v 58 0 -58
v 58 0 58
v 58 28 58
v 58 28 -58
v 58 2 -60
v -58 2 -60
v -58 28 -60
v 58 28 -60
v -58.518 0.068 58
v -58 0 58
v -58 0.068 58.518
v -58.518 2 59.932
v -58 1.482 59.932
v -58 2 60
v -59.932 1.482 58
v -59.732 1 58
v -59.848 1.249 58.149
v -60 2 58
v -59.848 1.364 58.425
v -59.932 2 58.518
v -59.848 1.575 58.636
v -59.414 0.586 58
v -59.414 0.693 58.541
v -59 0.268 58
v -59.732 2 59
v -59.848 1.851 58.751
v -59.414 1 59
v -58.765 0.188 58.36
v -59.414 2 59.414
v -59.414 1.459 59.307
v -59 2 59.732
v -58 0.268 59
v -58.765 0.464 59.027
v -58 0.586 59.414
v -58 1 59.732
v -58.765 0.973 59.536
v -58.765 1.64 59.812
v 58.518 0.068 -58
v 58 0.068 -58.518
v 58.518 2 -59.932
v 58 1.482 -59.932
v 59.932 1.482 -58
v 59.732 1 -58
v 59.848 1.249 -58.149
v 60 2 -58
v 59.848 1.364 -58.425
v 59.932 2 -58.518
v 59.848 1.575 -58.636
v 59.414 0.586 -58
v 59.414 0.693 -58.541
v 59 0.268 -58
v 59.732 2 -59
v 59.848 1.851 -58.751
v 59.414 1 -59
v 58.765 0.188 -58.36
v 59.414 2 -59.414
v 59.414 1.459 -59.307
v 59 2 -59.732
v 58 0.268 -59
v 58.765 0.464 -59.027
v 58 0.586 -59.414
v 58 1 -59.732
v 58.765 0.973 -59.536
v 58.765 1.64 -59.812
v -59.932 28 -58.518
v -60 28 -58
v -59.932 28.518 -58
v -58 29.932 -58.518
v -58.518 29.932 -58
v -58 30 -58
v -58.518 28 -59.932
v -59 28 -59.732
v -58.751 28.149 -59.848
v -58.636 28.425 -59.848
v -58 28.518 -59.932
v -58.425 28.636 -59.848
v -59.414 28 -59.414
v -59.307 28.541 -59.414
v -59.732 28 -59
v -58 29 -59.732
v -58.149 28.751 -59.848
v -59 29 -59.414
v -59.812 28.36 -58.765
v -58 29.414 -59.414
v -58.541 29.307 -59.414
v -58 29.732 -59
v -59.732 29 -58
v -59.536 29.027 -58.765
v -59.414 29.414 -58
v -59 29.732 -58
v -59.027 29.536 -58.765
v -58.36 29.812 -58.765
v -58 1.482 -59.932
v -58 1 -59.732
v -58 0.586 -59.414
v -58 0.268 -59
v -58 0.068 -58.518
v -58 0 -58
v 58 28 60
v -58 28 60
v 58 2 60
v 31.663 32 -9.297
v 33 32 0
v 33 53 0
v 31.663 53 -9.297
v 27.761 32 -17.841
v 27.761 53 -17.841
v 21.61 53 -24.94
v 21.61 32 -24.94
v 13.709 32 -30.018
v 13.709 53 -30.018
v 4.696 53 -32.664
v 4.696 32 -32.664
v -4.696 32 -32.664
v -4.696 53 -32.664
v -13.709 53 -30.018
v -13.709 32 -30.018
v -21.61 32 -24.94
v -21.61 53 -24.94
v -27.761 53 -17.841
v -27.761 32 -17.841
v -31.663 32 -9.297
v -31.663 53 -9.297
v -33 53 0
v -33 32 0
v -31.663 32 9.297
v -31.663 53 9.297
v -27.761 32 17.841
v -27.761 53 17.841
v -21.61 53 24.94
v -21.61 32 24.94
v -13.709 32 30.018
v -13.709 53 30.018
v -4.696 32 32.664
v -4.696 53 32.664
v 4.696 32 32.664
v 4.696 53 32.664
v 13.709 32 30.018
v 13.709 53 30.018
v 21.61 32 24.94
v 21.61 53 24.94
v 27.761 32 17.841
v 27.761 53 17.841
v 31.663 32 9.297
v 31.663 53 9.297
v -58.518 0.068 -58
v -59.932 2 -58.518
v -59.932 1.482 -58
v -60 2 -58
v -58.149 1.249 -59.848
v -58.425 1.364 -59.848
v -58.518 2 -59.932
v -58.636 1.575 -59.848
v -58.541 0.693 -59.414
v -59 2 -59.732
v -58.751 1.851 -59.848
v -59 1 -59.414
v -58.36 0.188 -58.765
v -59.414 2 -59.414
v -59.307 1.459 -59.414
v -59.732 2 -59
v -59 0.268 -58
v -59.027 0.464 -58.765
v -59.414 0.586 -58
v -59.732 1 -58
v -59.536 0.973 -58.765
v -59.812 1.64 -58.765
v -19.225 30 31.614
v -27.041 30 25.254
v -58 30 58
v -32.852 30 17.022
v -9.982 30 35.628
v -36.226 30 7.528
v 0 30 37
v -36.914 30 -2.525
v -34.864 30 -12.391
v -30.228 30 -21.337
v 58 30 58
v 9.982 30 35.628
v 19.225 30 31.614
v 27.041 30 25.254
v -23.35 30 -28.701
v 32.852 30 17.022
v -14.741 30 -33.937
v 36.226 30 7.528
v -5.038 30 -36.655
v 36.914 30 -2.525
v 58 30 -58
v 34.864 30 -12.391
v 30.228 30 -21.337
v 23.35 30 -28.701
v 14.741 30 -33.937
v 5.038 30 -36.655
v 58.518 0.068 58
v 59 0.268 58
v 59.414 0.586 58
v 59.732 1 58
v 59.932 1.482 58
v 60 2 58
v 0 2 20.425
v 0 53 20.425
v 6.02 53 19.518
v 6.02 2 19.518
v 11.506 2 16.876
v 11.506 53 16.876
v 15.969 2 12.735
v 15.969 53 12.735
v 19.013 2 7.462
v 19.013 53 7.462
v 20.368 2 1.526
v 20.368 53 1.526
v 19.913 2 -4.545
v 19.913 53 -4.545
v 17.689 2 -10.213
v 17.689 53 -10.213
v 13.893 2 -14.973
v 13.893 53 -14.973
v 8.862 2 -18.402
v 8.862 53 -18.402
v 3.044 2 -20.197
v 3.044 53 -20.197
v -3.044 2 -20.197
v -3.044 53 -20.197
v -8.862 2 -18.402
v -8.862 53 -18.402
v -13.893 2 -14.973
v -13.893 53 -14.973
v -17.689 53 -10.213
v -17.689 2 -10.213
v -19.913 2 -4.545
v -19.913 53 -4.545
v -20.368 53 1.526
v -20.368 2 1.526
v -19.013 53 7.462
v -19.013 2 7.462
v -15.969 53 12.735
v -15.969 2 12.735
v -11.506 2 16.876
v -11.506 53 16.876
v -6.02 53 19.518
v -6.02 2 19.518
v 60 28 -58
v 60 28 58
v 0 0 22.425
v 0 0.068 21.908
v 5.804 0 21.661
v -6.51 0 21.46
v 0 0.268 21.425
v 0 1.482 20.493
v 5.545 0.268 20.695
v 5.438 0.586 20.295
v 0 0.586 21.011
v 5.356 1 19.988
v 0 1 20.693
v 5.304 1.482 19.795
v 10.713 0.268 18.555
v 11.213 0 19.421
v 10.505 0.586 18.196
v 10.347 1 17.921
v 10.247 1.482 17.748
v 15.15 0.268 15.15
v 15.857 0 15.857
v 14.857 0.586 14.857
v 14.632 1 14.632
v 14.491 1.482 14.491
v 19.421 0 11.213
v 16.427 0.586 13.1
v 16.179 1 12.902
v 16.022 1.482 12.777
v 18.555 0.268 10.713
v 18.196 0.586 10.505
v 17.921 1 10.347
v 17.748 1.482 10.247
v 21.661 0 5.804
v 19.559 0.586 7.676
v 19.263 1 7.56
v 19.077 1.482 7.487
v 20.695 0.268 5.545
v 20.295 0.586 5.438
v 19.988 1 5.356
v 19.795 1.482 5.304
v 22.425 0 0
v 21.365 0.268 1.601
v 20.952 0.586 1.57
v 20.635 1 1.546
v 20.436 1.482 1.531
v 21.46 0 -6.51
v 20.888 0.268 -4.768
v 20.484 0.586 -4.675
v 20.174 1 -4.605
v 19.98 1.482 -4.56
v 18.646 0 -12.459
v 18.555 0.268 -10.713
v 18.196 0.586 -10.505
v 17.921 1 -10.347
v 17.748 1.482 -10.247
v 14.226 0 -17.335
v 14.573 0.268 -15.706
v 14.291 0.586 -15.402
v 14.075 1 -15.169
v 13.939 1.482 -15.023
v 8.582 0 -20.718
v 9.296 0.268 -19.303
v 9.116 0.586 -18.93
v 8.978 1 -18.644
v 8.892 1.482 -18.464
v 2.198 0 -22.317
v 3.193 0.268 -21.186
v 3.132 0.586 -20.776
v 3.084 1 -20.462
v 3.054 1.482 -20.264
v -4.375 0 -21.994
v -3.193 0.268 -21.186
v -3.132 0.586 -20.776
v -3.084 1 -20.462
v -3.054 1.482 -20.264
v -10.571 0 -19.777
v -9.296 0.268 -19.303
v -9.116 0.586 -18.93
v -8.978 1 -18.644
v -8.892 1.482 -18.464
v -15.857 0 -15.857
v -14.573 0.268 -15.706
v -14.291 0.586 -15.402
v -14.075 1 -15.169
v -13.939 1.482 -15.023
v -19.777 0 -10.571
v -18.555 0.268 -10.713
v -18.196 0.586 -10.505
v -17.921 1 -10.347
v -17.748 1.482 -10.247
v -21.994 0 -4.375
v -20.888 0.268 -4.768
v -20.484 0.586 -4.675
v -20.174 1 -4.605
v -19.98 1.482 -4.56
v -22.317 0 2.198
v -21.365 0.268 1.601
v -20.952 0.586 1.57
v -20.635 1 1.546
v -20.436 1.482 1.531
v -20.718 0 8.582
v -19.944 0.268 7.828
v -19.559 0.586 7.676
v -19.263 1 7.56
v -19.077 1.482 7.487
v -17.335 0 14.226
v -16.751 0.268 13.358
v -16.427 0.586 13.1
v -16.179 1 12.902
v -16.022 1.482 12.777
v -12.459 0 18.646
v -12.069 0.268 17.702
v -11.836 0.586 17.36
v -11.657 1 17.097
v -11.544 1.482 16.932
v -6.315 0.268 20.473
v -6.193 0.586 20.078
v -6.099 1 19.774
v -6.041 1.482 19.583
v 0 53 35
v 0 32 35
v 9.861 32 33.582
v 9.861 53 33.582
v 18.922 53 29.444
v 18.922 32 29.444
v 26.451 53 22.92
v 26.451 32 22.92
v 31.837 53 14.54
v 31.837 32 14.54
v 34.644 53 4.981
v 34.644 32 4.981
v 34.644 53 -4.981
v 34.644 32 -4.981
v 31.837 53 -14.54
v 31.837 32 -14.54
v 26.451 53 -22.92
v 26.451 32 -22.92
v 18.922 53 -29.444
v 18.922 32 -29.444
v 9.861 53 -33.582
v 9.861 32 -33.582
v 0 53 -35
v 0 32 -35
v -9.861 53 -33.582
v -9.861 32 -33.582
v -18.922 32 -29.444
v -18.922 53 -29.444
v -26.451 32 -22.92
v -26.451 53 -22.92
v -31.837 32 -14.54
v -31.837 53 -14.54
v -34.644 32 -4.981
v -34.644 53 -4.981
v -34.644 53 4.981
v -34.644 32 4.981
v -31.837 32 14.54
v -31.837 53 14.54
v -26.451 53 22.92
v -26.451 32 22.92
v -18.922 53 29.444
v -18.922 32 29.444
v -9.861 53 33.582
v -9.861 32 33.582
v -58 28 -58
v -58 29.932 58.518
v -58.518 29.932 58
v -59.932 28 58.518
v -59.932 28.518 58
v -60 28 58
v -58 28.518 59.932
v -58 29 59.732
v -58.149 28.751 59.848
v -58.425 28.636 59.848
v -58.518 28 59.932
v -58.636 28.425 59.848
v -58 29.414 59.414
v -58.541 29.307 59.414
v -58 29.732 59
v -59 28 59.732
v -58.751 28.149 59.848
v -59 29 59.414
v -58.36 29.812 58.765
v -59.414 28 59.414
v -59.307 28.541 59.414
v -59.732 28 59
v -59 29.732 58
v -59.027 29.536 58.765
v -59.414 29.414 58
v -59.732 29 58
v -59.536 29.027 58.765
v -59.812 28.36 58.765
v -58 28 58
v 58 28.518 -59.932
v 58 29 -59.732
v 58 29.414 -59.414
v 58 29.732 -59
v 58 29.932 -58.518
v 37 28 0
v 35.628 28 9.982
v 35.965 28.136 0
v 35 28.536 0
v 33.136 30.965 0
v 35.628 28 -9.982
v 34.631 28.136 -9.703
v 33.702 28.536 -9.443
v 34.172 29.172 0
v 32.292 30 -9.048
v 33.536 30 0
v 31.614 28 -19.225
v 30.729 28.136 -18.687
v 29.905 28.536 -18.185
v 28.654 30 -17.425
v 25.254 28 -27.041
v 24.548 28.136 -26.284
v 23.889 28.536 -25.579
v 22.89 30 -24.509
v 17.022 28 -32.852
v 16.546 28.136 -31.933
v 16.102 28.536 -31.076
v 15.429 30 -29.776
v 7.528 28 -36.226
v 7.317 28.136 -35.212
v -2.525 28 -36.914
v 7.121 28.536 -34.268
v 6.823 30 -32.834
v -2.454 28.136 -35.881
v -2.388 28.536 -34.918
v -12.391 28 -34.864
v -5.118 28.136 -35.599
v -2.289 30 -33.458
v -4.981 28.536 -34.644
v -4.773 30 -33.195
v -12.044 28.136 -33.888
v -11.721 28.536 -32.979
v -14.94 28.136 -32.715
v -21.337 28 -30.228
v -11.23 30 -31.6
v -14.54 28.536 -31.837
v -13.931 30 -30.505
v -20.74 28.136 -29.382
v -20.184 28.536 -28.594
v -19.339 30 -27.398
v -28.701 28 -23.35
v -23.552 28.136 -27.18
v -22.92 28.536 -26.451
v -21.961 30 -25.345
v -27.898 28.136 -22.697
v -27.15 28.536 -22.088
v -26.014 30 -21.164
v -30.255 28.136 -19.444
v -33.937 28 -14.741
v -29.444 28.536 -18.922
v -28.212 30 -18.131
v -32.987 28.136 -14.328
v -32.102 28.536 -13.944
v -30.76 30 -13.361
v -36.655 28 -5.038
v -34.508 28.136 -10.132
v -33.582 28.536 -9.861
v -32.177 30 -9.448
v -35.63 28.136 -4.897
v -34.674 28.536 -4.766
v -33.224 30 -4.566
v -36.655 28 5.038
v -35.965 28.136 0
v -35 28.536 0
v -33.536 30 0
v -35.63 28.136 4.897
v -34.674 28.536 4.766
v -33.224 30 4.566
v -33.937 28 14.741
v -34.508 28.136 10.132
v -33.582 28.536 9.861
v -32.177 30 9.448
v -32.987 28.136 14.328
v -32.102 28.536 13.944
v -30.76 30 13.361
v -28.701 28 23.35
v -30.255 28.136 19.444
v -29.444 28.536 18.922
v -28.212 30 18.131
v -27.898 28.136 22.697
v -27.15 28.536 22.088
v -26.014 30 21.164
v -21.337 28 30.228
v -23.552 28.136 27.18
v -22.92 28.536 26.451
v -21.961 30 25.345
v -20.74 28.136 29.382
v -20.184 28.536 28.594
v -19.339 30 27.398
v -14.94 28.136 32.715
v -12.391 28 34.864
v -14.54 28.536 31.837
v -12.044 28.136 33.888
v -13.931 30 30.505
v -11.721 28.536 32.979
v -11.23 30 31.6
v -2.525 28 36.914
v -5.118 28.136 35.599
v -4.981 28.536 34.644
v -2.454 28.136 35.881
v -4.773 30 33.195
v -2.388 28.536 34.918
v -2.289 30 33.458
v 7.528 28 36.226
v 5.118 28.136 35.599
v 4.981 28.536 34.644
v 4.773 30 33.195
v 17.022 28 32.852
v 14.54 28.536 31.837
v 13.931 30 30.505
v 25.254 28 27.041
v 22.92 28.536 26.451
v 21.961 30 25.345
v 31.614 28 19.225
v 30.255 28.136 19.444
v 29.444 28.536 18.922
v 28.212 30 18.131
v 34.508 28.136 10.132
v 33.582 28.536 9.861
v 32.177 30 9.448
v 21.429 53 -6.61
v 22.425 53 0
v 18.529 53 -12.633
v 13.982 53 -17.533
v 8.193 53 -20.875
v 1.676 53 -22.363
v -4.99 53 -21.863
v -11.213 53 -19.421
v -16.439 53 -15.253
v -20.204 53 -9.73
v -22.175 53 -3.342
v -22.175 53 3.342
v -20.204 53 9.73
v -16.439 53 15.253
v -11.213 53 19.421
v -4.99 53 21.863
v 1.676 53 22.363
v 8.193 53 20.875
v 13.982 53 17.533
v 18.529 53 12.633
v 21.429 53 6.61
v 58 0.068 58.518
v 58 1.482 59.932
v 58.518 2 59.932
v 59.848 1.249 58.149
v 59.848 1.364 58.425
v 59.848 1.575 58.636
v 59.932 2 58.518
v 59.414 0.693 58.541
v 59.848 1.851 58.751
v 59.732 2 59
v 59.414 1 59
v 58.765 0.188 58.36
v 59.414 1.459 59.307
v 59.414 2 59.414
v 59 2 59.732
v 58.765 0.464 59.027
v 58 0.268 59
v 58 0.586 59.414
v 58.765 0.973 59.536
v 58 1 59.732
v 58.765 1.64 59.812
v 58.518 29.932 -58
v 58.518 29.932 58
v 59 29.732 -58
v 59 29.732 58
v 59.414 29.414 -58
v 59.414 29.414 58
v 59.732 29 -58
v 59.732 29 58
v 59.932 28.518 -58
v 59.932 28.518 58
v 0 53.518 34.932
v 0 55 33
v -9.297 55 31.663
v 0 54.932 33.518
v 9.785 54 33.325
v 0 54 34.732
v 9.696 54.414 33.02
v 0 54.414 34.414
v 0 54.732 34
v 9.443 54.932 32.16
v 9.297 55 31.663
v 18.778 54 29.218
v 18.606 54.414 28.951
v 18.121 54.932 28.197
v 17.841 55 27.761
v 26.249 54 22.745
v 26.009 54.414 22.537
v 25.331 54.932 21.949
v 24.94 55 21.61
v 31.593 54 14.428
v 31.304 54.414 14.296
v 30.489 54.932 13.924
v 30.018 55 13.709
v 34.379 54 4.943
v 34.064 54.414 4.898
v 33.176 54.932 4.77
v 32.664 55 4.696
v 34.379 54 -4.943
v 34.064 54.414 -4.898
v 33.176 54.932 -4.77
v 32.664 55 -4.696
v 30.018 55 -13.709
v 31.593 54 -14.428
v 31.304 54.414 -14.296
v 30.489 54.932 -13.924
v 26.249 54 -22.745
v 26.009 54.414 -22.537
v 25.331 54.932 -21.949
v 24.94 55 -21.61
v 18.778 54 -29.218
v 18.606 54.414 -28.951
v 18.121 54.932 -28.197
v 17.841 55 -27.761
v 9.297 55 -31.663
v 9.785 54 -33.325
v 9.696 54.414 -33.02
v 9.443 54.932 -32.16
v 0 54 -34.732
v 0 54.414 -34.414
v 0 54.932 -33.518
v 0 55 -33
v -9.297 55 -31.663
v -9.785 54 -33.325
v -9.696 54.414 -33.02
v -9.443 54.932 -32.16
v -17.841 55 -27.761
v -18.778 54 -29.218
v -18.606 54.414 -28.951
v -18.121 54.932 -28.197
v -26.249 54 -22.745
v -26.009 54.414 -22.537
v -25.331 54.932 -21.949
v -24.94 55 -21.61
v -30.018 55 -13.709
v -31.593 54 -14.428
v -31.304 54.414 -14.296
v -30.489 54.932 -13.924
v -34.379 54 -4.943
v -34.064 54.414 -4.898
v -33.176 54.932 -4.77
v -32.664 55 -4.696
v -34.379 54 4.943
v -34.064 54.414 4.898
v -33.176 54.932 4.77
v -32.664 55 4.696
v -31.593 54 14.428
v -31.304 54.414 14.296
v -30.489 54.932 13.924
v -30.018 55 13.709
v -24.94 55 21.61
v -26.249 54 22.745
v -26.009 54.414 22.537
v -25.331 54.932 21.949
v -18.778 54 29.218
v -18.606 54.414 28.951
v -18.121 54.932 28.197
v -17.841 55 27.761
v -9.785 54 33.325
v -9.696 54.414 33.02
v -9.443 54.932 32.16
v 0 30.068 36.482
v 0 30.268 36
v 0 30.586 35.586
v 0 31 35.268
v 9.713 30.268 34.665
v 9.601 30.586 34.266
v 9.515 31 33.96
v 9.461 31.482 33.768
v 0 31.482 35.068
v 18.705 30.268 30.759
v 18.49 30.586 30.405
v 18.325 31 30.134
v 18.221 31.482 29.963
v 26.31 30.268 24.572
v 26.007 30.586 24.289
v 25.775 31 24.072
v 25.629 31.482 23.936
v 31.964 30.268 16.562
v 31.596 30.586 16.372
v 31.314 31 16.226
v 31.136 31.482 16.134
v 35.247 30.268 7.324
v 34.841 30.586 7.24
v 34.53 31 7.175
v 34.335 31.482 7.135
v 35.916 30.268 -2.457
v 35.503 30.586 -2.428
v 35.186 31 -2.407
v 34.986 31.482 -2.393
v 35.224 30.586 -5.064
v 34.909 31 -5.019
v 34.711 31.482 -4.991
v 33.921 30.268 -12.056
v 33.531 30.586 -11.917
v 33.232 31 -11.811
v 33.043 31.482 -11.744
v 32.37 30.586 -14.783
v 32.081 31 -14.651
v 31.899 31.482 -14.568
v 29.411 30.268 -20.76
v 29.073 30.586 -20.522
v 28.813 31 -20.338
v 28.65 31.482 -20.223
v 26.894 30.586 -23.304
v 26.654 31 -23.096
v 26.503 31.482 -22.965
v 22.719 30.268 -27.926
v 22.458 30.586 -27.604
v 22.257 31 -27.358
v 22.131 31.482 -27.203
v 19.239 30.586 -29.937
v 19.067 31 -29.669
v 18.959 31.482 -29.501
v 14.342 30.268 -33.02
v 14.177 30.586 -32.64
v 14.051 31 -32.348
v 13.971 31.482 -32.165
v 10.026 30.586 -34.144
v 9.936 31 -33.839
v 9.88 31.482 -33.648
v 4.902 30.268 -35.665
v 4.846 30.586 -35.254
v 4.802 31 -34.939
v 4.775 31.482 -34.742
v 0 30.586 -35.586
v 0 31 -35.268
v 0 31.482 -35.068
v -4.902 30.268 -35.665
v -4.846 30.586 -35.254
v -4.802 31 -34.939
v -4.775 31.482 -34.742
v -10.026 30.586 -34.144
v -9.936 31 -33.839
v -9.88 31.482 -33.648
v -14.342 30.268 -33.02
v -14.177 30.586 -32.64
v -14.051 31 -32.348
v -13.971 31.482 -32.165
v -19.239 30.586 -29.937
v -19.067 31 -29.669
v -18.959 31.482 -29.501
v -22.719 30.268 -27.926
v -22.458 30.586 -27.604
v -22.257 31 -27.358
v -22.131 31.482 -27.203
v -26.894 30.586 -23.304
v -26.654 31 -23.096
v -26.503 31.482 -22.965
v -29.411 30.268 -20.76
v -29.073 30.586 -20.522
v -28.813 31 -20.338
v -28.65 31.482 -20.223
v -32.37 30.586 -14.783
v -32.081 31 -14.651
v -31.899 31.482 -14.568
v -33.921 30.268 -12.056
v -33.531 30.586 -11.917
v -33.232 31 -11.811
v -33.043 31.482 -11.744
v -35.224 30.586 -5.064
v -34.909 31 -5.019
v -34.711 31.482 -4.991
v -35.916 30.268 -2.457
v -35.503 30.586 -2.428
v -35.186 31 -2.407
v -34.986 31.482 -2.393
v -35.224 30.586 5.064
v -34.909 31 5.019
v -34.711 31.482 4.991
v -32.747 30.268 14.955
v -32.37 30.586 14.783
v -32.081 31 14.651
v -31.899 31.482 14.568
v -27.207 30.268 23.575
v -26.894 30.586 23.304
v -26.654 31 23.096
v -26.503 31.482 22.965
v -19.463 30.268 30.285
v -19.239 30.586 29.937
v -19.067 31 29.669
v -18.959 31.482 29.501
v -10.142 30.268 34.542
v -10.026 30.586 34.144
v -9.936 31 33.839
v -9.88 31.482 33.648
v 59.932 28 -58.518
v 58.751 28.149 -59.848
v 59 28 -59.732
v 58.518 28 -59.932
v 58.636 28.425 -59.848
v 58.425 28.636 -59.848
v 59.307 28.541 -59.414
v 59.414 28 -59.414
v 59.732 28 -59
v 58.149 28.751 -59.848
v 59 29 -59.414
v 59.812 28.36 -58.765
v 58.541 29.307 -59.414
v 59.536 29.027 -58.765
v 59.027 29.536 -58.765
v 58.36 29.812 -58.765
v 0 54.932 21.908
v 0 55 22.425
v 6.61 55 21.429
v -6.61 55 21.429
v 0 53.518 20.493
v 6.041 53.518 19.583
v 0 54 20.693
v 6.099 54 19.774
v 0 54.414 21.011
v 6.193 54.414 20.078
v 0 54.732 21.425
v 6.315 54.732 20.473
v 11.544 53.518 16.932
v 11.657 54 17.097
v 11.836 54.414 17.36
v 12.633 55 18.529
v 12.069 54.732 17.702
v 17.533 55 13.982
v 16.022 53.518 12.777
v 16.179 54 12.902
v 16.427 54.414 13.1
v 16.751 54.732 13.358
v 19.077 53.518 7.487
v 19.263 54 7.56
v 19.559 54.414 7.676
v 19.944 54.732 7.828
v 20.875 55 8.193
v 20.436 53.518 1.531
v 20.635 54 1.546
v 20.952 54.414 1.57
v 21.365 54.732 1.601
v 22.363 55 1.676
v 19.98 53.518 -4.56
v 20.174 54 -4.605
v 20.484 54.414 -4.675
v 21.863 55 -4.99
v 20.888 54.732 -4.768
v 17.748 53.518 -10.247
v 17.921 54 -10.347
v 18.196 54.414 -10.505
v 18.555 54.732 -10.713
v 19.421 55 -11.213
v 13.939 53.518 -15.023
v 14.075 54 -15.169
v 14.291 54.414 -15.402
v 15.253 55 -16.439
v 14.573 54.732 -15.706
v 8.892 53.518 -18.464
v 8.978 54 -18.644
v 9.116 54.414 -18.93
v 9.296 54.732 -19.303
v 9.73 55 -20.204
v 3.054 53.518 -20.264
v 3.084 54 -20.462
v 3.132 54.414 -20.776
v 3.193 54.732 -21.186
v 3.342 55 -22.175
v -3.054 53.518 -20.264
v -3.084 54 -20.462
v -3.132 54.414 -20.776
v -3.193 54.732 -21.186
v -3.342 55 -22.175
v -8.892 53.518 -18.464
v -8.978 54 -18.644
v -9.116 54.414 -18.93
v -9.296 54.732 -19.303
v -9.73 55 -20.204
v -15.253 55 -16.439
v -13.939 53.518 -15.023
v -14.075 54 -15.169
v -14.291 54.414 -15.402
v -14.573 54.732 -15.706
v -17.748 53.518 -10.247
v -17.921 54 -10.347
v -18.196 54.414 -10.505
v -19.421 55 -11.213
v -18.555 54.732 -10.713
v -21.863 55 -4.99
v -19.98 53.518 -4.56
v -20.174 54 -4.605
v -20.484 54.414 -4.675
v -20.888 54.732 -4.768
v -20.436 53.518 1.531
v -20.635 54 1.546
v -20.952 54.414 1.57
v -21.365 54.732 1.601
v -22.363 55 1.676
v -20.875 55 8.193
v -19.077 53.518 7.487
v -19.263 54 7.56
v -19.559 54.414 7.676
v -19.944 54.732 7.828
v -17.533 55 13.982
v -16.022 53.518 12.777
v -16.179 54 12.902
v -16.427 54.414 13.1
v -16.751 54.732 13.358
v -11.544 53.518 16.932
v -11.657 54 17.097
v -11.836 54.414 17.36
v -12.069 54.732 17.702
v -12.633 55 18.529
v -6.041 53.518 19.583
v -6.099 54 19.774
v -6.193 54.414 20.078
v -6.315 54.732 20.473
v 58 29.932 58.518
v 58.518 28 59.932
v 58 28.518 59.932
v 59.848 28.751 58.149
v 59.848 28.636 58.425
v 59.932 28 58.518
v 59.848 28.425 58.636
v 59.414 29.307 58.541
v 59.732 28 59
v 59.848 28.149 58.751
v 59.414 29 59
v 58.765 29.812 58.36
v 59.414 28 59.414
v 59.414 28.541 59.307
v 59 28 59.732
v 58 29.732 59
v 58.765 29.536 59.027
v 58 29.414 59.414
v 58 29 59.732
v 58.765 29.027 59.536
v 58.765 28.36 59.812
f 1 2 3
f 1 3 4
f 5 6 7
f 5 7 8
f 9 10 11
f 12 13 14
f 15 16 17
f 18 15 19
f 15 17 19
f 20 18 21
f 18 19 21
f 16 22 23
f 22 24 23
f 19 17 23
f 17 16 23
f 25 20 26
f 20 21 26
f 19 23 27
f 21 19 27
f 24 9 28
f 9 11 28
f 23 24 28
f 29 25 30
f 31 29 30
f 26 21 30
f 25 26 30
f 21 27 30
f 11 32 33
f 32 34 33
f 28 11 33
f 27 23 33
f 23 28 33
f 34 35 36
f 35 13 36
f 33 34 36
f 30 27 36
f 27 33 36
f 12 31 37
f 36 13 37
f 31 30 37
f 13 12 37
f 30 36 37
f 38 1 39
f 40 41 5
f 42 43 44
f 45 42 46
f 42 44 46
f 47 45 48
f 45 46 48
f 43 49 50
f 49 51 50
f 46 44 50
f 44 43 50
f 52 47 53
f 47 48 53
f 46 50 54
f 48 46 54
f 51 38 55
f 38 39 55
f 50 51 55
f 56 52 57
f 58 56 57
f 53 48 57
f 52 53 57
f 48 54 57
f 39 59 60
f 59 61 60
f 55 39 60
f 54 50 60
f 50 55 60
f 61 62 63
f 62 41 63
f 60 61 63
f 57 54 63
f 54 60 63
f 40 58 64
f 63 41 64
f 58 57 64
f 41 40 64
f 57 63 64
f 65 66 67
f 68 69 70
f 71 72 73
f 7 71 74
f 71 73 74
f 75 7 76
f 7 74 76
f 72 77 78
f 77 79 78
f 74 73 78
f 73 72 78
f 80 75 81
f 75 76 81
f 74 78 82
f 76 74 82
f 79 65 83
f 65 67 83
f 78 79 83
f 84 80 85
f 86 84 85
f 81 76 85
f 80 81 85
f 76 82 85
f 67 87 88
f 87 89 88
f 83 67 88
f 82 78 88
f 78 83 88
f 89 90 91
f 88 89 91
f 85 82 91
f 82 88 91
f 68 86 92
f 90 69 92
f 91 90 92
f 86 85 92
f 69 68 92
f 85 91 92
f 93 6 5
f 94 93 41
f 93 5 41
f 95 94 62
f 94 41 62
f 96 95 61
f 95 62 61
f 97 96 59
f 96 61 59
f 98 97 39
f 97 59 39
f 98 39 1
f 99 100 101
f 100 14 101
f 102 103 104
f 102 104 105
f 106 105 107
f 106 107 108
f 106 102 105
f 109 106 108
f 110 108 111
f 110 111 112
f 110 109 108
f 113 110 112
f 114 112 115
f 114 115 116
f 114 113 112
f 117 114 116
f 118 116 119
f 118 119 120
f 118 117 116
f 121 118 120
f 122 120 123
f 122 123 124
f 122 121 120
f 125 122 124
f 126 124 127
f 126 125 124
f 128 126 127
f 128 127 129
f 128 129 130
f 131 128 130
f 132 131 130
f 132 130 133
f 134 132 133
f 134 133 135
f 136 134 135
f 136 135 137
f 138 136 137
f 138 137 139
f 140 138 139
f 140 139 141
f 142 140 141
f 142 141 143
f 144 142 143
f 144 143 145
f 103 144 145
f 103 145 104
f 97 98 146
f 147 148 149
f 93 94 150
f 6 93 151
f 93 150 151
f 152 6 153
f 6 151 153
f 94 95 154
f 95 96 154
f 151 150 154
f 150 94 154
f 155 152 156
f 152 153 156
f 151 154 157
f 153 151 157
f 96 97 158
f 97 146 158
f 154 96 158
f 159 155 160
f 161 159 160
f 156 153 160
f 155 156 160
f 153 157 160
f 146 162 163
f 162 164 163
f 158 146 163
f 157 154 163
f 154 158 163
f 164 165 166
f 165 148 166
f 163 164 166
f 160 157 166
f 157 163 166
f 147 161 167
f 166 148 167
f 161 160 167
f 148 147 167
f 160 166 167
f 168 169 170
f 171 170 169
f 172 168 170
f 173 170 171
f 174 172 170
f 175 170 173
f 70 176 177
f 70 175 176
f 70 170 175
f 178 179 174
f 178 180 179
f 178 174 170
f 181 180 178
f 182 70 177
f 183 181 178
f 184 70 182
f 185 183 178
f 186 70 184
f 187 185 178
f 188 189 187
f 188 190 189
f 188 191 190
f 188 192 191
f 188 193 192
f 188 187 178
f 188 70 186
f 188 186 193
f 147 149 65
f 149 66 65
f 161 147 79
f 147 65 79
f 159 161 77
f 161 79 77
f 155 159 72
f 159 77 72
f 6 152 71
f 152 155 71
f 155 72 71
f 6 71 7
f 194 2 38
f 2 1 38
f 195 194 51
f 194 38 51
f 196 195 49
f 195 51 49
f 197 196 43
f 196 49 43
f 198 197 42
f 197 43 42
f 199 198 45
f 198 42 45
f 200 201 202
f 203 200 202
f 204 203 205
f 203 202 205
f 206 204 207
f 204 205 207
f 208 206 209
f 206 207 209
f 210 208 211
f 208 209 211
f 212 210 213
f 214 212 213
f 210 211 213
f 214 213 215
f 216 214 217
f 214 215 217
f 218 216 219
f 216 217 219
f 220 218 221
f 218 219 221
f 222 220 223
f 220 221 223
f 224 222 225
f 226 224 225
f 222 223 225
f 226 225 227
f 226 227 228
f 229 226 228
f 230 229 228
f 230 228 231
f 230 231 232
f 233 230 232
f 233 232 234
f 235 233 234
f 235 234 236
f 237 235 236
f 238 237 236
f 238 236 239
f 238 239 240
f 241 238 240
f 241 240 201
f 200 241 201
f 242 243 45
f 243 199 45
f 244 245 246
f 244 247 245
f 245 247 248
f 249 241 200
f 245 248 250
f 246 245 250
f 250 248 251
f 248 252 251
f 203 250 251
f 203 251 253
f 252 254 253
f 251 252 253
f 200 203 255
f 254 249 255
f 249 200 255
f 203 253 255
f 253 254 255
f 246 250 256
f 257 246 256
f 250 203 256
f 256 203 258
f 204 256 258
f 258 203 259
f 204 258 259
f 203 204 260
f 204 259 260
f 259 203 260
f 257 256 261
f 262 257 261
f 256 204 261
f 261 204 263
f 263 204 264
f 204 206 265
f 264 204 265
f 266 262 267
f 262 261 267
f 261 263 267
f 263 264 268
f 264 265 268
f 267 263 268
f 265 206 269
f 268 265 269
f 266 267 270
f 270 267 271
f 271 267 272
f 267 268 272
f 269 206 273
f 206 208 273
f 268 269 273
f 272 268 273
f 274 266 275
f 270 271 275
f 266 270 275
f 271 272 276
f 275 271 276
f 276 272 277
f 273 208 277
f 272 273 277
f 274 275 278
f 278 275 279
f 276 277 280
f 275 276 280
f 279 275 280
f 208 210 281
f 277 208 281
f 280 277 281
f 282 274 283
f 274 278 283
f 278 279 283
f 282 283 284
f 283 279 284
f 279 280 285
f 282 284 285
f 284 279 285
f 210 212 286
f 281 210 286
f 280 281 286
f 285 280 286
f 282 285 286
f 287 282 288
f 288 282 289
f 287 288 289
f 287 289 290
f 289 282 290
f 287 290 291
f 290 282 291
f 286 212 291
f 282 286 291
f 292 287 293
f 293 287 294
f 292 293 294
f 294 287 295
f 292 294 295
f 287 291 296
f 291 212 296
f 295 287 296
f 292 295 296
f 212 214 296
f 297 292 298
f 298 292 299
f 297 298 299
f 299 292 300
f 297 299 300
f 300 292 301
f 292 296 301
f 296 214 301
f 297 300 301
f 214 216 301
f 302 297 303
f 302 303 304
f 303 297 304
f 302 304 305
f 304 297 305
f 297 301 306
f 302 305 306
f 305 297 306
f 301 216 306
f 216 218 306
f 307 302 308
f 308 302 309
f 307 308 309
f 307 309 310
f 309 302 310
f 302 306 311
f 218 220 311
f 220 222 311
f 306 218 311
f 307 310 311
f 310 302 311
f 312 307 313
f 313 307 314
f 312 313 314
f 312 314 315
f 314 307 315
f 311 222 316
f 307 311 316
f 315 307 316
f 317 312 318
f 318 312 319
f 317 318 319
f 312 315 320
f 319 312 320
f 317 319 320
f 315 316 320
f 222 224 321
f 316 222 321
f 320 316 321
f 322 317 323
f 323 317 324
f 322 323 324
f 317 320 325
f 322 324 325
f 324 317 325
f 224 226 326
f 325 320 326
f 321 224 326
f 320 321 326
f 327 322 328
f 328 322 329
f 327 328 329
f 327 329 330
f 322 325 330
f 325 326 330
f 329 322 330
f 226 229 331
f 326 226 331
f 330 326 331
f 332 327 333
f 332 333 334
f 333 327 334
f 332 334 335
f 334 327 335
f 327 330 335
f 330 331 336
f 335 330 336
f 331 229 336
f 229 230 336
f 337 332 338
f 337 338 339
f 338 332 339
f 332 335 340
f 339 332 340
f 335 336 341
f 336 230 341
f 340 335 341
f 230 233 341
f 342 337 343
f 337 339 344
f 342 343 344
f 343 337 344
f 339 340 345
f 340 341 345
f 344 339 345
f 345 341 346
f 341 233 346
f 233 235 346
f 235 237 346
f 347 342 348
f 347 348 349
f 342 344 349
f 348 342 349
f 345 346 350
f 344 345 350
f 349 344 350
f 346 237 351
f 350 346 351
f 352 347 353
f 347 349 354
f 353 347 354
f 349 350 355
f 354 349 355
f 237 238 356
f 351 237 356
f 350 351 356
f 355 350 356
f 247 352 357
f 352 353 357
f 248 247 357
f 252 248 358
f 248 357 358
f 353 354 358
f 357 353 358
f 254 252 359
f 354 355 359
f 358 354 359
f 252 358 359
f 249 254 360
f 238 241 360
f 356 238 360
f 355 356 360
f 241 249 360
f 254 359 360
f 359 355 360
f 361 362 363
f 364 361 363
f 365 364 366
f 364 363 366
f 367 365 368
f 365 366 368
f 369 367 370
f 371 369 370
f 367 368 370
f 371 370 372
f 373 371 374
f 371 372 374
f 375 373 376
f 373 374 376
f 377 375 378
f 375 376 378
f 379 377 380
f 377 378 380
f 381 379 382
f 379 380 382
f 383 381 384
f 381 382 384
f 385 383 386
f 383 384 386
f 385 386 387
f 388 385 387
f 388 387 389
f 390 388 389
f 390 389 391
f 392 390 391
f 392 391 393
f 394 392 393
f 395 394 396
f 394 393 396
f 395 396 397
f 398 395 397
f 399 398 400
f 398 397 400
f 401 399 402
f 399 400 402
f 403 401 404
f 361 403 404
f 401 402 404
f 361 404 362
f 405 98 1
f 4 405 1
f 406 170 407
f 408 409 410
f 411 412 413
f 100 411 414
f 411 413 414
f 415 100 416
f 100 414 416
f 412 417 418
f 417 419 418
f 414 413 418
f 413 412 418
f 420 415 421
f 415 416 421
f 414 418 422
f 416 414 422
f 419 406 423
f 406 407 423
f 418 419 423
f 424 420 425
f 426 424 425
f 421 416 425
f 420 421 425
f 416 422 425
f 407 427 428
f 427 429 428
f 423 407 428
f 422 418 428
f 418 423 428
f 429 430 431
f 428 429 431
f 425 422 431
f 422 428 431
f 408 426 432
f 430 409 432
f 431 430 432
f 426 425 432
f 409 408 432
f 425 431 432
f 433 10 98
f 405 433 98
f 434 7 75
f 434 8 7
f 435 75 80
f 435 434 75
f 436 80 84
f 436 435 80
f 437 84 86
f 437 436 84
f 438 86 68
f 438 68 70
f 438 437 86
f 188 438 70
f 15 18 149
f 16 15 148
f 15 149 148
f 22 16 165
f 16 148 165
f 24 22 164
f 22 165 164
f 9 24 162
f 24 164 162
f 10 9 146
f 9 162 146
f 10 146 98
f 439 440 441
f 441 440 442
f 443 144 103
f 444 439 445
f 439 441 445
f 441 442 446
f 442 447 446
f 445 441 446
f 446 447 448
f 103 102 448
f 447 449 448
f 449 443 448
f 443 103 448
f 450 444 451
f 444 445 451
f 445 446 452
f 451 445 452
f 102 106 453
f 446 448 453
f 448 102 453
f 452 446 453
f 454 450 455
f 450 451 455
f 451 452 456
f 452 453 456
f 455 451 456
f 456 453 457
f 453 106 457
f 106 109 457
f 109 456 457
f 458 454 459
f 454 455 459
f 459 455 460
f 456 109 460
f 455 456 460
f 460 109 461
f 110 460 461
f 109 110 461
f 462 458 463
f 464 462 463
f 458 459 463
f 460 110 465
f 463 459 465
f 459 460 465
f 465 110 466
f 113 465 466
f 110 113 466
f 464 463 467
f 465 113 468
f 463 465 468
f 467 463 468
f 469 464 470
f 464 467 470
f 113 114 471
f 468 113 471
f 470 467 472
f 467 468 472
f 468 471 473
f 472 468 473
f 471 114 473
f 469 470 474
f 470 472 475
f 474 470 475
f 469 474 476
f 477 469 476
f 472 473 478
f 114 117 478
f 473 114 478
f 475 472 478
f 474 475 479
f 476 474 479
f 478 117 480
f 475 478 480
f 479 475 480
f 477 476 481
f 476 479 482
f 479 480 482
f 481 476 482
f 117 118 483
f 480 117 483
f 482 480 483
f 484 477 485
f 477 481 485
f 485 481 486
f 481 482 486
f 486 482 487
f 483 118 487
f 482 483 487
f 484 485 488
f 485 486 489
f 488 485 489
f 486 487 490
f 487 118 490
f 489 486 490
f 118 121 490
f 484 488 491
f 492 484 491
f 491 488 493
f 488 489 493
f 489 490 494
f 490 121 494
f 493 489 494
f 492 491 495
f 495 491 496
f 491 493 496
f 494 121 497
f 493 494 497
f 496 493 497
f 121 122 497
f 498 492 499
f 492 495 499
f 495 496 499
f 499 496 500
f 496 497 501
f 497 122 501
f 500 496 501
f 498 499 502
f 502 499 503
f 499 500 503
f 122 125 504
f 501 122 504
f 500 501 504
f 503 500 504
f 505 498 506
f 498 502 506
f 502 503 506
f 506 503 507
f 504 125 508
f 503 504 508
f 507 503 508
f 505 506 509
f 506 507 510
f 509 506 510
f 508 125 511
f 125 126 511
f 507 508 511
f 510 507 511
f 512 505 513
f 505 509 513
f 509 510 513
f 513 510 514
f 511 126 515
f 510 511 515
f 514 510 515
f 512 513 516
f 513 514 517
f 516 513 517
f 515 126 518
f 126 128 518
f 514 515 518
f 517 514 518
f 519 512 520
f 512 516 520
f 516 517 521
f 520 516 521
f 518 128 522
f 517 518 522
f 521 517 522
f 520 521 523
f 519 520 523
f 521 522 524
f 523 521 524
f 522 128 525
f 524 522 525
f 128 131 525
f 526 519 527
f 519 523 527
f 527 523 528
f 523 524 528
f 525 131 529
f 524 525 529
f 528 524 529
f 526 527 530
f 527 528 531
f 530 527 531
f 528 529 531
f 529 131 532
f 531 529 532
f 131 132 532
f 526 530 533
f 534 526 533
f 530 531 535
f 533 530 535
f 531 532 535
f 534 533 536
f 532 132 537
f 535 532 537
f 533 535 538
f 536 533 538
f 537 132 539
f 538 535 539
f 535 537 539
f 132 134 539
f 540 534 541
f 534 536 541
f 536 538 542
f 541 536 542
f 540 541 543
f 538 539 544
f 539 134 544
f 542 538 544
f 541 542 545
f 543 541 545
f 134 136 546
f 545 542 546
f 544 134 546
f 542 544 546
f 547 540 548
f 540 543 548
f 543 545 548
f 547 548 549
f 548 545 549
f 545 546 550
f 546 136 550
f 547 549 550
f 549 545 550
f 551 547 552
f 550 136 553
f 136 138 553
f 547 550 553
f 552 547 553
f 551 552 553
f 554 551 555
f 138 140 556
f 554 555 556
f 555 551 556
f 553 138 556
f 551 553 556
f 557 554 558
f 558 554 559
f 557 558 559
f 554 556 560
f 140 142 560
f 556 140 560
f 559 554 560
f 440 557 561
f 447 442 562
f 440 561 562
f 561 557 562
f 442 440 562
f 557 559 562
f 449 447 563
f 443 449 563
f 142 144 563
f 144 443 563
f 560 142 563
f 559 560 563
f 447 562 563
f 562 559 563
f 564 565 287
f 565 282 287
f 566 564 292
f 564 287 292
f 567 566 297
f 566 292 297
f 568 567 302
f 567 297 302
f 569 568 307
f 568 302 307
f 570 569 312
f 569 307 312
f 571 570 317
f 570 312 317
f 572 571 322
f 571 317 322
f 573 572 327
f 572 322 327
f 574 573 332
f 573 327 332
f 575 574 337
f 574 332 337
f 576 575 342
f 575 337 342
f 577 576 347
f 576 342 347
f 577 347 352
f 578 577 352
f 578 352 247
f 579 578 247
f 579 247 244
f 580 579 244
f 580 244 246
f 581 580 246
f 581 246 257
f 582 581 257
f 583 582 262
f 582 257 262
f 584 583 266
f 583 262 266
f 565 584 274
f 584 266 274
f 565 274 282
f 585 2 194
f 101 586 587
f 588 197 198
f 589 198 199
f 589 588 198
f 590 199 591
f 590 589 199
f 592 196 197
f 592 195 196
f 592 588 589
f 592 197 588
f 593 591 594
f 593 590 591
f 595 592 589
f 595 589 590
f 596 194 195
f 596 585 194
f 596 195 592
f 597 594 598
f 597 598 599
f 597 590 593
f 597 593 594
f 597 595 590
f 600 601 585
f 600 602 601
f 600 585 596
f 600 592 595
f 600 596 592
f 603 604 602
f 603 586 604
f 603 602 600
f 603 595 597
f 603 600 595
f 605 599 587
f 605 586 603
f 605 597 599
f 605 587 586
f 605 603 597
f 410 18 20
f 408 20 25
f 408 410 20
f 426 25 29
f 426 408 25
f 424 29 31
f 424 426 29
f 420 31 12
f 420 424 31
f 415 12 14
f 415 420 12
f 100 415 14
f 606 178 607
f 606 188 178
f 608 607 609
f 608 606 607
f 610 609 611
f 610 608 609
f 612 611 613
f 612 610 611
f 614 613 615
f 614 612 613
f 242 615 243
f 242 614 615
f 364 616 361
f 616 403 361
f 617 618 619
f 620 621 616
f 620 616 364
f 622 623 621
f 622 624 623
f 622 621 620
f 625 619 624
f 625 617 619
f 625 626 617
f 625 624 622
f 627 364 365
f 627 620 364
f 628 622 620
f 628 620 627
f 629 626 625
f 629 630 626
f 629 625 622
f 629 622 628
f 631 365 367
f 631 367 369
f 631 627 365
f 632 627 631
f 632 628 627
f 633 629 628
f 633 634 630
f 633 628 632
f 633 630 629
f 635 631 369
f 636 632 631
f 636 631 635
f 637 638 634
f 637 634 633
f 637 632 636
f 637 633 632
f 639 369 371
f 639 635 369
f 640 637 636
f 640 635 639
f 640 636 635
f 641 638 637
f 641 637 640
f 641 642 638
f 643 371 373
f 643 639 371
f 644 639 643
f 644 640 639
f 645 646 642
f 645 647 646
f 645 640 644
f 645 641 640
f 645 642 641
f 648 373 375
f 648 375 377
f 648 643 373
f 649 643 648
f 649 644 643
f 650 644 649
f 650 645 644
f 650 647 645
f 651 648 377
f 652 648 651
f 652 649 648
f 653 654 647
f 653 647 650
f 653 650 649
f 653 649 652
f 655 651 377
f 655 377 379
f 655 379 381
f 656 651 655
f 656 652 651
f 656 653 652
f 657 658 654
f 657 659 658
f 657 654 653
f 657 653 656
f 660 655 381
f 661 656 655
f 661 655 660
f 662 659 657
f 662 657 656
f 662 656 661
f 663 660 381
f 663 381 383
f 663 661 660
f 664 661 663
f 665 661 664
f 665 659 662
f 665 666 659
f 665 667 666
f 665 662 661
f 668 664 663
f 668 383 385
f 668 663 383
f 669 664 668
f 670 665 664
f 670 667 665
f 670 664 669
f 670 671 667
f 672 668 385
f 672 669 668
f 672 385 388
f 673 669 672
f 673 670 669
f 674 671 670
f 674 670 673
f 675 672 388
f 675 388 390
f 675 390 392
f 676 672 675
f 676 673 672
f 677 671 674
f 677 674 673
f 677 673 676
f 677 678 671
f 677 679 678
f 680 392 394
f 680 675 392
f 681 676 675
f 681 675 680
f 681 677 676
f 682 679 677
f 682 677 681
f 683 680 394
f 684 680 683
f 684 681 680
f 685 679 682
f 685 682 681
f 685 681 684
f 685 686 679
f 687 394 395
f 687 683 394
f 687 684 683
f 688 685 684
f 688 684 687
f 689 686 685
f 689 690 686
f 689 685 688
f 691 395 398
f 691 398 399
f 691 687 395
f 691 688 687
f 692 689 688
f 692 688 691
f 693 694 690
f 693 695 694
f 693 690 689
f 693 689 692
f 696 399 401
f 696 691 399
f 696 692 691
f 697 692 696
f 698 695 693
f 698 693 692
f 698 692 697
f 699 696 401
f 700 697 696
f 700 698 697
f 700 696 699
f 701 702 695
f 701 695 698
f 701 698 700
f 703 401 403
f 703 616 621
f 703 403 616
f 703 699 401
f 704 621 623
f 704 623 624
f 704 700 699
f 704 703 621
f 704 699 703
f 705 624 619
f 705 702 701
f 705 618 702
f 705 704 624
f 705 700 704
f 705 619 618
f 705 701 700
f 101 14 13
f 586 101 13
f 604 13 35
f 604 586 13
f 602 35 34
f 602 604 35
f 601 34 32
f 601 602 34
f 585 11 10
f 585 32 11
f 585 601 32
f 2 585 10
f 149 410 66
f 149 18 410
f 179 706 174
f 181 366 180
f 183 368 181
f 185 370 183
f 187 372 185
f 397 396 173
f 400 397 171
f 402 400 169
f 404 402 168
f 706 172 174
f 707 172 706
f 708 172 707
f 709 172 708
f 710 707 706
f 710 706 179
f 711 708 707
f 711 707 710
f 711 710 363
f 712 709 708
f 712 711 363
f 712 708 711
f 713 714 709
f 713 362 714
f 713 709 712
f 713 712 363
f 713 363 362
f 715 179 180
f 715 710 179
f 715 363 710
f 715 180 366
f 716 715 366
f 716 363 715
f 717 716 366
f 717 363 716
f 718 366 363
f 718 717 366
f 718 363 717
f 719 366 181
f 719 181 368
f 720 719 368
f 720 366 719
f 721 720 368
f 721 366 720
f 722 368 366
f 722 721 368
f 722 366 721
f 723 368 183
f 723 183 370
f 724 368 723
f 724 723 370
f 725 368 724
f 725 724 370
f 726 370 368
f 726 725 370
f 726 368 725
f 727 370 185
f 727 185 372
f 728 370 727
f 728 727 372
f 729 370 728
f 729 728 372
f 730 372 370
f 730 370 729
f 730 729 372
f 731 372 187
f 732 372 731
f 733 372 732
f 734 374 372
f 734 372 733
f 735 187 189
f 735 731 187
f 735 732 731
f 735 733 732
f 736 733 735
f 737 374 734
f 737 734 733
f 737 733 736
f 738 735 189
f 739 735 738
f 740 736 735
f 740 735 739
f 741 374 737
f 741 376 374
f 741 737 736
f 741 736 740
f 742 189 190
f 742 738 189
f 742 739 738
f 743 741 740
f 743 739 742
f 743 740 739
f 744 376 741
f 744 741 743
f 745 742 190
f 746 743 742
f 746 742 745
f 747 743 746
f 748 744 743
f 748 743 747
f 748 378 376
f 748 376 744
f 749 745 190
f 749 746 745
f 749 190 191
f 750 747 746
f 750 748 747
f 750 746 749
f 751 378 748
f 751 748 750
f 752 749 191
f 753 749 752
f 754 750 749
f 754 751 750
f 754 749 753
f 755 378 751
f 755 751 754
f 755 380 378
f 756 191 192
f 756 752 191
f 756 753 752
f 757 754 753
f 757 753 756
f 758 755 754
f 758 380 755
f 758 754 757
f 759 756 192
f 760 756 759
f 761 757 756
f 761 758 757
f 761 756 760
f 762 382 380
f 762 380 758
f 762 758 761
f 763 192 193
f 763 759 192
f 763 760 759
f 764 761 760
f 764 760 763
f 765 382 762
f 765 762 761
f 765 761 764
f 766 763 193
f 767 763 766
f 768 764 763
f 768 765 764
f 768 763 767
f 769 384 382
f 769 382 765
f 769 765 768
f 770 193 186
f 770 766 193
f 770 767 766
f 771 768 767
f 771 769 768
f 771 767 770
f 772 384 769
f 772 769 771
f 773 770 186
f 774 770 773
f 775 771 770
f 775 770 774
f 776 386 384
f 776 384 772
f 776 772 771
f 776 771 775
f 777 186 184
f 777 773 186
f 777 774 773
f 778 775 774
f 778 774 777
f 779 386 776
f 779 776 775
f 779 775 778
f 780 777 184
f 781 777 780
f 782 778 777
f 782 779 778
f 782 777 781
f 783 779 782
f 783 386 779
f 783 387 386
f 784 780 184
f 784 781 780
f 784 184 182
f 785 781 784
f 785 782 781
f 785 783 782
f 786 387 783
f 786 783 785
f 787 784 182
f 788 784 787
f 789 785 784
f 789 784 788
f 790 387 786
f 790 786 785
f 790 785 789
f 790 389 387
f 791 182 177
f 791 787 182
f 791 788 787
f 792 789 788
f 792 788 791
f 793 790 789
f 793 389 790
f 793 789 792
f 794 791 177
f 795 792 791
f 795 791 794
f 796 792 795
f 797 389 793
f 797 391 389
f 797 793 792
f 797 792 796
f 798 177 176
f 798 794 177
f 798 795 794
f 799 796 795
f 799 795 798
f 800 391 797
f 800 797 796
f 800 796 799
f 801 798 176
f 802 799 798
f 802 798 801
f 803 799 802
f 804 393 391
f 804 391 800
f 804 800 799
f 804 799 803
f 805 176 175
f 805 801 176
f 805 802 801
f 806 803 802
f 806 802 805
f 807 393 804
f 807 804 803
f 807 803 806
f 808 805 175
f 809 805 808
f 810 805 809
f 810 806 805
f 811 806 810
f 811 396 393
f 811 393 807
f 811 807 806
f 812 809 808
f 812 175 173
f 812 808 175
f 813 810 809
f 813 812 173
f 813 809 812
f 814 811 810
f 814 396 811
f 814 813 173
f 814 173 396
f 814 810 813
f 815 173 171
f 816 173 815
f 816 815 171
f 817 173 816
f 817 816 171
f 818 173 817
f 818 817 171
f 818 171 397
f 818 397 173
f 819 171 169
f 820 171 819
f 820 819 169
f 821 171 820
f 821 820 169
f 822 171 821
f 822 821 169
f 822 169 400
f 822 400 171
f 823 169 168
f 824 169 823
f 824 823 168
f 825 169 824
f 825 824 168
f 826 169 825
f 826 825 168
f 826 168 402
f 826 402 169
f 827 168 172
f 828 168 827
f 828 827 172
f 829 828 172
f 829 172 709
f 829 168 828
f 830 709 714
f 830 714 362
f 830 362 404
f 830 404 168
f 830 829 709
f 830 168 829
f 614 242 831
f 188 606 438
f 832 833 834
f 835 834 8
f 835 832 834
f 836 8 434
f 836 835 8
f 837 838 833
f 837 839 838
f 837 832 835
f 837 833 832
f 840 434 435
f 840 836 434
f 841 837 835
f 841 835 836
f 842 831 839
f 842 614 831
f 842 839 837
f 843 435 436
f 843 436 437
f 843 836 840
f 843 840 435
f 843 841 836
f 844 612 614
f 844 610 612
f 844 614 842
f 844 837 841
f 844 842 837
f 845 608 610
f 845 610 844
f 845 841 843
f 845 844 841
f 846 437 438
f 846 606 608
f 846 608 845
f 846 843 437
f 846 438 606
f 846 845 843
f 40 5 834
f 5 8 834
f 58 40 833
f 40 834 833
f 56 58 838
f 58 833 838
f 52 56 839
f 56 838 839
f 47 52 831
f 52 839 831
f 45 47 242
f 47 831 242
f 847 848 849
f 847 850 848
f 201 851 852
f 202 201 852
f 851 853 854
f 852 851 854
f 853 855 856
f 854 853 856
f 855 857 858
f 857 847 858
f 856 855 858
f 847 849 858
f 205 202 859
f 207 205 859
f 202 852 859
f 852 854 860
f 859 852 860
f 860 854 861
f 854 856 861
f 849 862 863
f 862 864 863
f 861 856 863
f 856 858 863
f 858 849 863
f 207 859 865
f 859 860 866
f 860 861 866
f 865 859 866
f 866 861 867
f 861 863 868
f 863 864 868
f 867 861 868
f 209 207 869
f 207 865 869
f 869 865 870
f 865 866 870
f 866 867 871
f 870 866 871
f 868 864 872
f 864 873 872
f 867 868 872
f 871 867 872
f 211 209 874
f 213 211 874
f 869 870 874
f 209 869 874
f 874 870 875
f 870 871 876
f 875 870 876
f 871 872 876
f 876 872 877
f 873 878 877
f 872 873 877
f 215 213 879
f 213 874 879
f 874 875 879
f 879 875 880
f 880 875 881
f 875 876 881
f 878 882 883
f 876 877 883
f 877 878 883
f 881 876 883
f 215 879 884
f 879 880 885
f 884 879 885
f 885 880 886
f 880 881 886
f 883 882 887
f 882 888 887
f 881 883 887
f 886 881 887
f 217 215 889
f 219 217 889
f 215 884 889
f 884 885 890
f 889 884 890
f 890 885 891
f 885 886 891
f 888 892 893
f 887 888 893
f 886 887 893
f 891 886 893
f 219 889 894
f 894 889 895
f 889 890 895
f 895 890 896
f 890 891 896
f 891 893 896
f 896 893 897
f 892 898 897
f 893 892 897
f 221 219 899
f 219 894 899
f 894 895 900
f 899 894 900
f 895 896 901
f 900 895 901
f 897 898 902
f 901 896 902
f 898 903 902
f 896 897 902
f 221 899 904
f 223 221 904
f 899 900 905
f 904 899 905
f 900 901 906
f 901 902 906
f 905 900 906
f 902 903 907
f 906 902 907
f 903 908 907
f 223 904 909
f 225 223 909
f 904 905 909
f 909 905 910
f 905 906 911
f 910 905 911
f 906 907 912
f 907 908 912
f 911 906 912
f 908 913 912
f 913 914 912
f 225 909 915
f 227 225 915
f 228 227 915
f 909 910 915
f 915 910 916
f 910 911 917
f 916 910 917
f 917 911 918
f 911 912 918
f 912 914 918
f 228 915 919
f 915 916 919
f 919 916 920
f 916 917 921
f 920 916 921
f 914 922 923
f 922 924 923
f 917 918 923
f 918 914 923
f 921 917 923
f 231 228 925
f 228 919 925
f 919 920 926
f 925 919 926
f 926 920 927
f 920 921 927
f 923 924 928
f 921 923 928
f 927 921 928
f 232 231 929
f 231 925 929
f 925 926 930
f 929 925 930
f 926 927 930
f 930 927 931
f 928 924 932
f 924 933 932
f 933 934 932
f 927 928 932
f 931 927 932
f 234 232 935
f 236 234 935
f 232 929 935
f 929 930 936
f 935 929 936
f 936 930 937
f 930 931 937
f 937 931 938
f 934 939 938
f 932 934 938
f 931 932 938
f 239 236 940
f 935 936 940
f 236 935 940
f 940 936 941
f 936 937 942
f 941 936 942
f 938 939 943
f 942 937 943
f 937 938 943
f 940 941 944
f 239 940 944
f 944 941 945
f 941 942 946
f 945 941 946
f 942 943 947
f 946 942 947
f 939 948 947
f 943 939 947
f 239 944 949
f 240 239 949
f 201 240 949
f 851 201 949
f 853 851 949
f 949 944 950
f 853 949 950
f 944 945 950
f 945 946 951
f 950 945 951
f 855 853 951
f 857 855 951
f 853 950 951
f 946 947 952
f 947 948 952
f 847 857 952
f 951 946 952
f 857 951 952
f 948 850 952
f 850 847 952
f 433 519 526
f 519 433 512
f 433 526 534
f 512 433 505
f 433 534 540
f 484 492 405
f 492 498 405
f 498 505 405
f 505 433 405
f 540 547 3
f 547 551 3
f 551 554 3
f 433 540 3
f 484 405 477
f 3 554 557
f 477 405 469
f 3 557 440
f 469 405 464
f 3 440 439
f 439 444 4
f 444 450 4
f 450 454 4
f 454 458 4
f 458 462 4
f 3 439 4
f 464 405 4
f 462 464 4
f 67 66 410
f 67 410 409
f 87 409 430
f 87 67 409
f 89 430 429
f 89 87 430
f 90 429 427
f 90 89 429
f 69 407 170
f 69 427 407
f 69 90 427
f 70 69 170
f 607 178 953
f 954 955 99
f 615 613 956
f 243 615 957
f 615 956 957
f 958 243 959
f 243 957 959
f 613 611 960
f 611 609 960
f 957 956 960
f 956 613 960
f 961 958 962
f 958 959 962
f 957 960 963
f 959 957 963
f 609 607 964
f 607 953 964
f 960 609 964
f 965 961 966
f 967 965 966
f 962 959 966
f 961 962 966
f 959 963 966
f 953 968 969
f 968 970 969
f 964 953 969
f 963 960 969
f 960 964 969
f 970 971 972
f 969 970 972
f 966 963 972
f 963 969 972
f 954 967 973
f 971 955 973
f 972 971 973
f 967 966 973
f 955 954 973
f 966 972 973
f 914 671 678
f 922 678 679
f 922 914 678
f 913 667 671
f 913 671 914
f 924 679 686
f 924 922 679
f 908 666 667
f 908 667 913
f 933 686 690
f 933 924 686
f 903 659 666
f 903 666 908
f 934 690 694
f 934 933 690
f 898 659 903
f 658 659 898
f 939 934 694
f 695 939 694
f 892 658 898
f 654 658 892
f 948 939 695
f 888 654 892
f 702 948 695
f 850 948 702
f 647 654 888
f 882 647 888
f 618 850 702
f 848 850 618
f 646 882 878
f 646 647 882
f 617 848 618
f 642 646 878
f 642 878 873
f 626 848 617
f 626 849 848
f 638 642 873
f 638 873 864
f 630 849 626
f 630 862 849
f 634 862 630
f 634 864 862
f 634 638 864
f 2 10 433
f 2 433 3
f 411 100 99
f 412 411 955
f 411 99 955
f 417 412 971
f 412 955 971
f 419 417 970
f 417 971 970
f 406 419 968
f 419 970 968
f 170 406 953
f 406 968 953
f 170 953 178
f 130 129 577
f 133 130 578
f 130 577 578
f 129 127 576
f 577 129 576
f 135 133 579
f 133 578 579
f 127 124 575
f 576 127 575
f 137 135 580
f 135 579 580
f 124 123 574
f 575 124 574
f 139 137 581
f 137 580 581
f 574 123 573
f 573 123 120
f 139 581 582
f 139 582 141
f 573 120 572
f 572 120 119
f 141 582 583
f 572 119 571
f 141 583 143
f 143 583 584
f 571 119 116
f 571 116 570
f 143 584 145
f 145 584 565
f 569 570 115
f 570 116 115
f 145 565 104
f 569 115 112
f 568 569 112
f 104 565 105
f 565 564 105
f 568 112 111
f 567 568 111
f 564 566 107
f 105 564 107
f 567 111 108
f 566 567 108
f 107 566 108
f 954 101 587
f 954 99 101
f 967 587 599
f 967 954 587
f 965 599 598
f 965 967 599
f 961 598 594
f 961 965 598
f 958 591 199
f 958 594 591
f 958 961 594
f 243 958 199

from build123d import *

# Parameters (mm, degrees)
SKETCH1_W            = 120
SKETCH1_H            = 120
BOSS_EXTRUDE1_DEPTH  = 30
SKETCH2_R            = 35
BOSS_EXTRUDE2_DEPTH  = 25
SKETCH3_R            = 20.425210732
CUT_EXTRUDE1_DEPTH   = 102.118742081
FILLET10_R           = 2
SHELL1_OUTLINE_W     = 116
SHELL1_OUTLINE_H     = 116
SHELL1_OUTLINE_R     = 22.425210732
SHELL1_DEPTH         = 28
SHELL1_START         = 28
SHELL1_2_OUTLINE_R   = 33
SHELL1_2_OUTLINE_R_2 = 22.425210732
SHELL1_2_DEPTH       = 25


with BuildPart() as part:
    # Sketch1 → Boss-Extrude1 (new body)
    with BuildSketch(Plane(origin=(0, 0, 0), x_dir=(1, 0, 0), z_dir=(0, 1, 0))):
        Rectangle(SKETCH1_W, SKETCH1_H)
    extrude(amount=BOSS_EXTRUDE1_DEPTH)

    # Sketch2 → Boss-Extrude2 (add)
    with BuildSketch(Plane(origin=(0, 30, 0), x_dir=(1, 0, 0), z_dir=(0, 1, 0))):
        with Locations(Location((0, 0, 0), (0, 0, 270))):
            Circle(SKETCH2_R)
    extrude(amount=BOSS_EXTRUDE2_DEPTH)

    # Sketch3 → Cut-Extrude1 (cut, through all)
    with BuildSketch(Plane(origin=(0, 55, 0), x_dir=(1, 0, 0), z_dir=(0, 1, 0))):
        with Locations(Location((0, 0, 0), (0, 0, 270))):
            Circle(SKETCH3_R)
    extrude(amount=-CUT_EXTRUDE1_DEPTH, mode=Mode.SUBTRACT)

    # Fillet10
    fillet10_edges = [part.edges().sort_by_distance(p)[0] for p in [
        (-60, 30, 0),
        (0, 30, -35),
        (0, 55, -35),
        (0, 30, 60),
        (0, 0, -20.425210732),
        (0, 55, -20.425210732),
        (60, 30, 0),
        (0, 0, 60),
        (-60, 0, 0),
        (0, 0, -60),
        (60, 0, 0),
        (60, 15, 60),
        (-60, 15, 60),
        (-60, 15, -60),
        (60, 15, -60),
        (0, 30, -60),
    ]]
    fillet(fillet10_edges, radius=FILLET10_R)

    # Shell1: read off the stored shape, not the designer's step
    # Shell1 outline → Shell1 (cut)
    with BuildSketch(Plane(origin=(0, 0, 0), x_dir=(1, 0, 0), z_dir=(0, 1, 0))):
        Rectangle(SHELL1_OUTLINE_W, SHELL1_OUTLINE_H)
        Circle(SHELL1_OUTLINE_R, mode=Mode.SUBTRACT)
    extrude(amount=SHELL1_DEPTH, mode=Mode.SUBTRACT)

    # Shell1 2 outline → Shell1 2 (cut)
    with BuildSketch(Plane(origin=(0, 0, 0), x_dir=(1, 0, 0), z_dir=(0, 1, 0)).offset(SHELL1_START)):
        Circle(SHELL1_2_OUTLINE_R)
        Circle(SHELL1_2_OUTLINE_R_2, mode=Mode.SUBTRACT)
    extrude(amount=SHELL1_2_DEPTH, mode=Mode.SUBTRACT)

    # Shell1 3 outline → Shell1 3 (revolve, cut)
    with BuildSketch(Plane.XY):
        with BuildLine():
            ThreePointArc((37, 28), (34.171572875, 29.171572875), (33, 32))
            Line((33, 32), (33, 28))
            Line((33, 28), (37, 28))
        make_face()
    revolve(axis=Axis((0, 0, 0), (0, 1, 0)), mode=Mode.SUBTRACT)


solid = part.part
